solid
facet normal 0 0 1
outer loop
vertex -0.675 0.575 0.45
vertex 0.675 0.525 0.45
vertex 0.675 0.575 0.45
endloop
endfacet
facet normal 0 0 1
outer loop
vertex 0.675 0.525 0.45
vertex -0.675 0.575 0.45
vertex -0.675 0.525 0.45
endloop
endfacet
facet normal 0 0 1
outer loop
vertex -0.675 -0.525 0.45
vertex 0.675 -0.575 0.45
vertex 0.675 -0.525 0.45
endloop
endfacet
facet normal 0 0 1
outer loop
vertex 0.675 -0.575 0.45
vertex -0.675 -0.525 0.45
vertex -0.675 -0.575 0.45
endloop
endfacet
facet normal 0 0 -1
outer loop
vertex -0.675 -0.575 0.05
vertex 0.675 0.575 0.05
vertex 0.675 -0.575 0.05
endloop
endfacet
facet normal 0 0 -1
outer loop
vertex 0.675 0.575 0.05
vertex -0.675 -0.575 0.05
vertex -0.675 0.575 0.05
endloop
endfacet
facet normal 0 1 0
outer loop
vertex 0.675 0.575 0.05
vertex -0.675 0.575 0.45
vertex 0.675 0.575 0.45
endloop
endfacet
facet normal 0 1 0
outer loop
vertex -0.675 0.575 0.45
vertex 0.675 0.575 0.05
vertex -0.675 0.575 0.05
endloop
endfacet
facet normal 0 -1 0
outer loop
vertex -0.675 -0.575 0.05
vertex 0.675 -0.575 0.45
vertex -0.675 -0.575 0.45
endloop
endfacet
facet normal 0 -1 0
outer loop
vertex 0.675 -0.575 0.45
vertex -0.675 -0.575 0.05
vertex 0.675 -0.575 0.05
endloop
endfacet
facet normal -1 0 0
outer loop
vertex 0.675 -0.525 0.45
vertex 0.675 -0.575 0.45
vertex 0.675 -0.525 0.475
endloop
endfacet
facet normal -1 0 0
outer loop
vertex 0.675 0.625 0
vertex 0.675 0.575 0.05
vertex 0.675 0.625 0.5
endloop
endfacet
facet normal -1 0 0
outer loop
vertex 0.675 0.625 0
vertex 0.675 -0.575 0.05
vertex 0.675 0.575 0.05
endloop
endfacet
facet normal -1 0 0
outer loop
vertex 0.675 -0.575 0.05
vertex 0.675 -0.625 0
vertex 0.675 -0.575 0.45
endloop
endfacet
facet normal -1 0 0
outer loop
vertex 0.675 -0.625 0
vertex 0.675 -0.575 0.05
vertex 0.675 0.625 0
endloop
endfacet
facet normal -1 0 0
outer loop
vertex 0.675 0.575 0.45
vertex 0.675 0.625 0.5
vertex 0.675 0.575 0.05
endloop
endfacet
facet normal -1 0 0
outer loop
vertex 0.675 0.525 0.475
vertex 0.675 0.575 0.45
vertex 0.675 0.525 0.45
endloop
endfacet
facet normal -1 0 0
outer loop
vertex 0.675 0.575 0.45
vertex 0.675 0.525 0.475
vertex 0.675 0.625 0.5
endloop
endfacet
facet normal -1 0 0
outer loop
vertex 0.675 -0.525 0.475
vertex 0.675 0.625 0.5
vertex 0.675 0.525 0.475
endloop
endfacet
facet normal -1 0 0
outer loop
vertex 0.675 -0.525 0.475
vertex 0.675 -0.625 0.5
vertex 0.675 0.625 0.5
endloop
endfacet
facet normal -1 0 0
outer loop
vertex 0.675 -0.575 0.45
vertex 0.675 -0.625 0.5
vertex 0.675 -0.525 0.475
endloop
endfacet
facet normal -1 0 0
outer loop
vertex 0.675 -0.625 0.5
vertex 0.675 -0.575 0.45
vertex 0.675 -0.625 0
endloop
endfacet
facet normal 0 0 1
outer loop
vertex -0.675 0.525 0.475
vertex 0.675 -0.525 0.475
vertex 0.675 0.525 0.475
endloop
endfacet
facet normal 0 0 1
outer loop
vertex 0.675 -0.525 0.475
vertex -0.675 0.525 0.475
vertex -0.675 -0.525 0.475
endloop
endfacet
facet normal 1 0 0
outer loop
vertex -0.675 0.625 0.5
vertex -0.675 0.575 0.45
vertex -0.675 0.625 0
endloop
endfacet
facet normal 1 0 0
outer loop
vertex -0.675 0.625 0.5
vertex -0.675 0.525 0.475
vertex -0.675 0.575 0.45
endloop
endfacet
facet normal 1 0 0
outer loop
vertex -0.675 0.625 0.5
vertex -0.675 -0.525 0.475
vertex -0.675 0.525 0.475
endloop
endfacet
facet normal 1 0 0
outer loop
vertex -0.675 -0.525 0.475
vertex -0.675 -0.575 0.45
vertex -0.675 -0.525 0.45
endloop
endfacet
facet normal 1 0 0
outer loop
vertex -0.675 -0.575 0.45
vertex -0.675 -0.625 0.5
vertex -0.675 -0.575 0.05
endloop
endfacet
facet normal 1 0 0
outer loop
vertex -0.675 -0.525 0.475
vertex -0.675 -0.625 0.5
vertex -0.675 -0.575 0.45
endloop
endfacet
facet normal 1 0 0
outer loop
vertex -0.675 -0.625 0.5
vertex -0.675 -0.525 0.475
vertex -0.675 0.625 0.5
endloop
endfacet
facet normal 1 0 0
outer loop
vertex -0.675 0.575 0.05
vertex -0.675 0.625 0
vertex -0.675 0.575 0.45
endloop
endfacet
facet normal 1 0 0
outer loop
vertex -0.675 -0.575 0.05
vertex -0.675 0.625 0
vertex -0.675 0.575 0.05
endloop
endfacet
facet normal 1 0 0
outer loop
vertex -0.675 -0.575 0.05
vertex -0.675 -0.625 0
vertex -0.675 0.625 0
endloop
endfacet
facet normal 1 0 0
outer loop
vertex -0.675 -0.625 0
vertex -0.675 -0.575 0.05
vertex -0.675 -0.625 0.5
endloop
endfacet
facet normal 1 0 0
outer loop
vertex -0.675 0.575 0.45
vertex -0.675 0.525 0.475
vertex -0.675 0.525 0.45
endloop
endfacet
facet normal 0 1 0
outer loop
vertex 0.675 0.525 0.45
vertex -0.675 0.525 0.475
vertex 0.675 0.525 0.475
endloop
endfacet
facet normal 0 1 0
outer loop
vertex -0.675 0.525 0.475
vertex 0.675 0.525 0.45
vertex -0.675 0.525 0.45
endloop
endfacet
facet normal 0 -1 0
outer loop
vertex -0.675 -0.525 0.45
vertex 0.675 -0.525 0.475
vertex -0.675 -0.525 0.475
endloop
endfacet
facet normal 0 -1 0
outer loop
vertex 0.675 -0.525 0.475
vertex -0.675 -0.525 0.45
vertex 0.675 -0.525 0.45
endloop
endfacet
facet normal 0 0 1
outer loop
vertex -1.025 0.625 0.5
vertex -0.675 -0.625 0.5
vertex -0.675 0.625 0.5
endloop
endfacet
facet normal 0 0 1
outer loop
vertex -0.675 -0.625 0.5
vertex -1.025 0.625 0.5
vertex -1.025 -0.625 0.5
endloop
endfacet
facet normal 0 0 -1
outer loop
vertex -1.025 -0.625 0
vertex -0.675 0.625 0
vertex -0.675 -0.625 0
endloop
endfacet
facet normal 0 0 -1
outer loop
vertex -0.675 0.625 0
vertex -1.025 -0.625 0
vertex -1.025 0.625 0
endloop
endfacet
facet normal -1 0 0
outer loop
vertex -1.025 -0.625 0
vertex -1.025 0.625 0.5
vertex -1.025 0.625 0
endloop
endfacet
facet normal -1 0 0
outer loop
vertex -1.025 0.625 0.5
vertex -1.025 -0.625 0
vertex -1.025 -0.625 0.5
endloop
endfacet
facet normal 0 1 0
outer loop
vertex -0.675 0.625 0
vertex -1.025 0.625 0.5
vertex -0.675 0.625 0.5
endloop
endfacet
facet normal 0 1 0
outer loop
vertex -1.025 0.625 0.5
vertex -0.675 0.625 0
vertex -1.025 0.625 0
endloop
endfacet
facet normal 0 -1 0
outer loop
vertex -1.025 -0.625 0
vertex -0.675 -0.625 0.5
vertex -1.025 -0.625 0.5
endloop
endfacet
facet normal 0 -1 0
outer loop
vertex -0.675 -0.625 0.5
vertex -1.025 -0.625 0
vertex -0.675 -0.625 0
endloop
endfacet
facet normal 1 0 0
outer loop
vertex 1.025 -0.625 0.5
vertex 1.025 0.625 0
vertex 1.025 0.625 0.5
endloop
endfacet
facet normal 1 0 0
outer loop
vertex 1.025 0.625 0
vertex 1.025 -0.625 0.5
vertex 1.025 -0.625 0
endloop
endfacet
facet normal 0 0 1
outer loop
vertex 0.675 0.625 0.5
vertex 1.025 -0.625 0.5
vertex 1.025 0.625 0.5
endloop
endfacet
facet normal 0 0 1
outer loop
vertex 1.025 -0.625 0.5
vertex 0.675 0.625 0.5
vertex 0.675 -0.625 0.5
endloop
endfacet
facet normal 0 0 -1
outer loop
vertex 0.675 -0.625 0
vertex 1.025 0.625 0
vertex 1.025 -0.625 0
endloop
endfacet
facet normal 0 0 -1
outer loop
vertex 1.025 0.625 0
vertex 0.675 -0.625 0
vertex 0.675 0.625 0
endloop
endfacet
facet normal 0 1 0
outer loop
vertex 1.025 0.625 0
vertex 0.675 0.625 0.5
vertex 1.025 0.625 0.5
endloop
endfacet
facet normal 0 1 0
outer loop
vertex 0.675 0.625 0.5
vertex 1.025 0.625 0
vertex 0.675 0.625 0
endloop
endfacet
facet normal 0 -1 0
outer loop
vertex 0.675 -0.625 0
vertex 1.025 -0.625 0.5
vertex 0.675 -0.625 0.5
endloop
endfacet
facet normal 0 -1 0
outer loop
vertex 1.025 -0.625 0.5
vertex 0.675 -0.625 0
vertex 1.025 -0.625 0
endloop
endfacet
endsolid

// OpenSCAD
// file: proto/chip-r.scad
/*
OpenSCAD Model:  chip resistor

  L  - body length
  T  - pad length
  W  - width
  H  - height
  padcolor - color of metal leads
  bodycolor - color of body
  topcolor - color body top
  simple - 0 = realistic model, 1 = simplified model
*/

module chip_r(
	L=2.05,
	T=0.35,
	W=1.25,
	H=0.50,
	padcolor=[0.9,0.9,0.9],
	bodycolor=[1,1,0.9],
	topcolor=[0.0,0.0,0.0],
	labelcolor=[1,1,1],
	label="330",
	simple=1
) {

	module chippad() {
		if (simple) {
			color(padcolor)cube([T,W,H],center=true);
		} else {
			color(padcolor) union () {
				cube([T-0.1,W-0.1,H    ],center=true);
				cube([T-0.1,W    ,H-0.1],center=true);
				cube([T    ,W-0.1,H-0.1],center=true);
				translate([-T/2+0.05,-W/2+0.05,0]) cylinder(r=0.05,h=H-0.1,$fn=30,center=true);
				translate([T/2-0.05,-W/2+0.05,0]) cylinder(r=0.05,h=H-0.1,$fn=30,center=true);
				translate([-T/2+0.05,W/2-0.05,0]) cylinder(r=0.05,h=H-0.1,$fn=30,center=true);
				translate([T/2-0.05,W/2-0.05,0]) cylinder(r=0.05,h=H-0.1,$fn=30,center=true);
				translate([-T/2+0.05,0,H/2-0.05]) rotate(90,[1,0,0])cylinder(r=0.05,h=W-0.1,$fn=30,center=true);
				translate([T/2-0.05,0,H/2-0.05]) rotate(90,[1,0,0])cylinder(r=0.05,h=W-0.1,$fn=30,center=true);
				translate([-T/2+0.05,0,-H/2+0.05]) rotate(90,[1,0,0])cylinder(r=0.05,h=W-0.1,$fn=30,center=true);
				translate([T/2-0.05,0,-H/2+0.05]) rotate(90,[1,0,0])cylinder(r=0.05,h=W-0.1,$fn=30,center=true);
				translate([0,-W/2+0.05,H/2-0.05]) rotate(90,[0,1,0])cylinder(r=0.05,h=T-0.1,$fn=30,center=true);
				translate([0,W/2-0.05,H/2-0.05]) rotate(90,[0,1,0])cylinder(r=0.05,h=T-0.1,$fn=30,center=true);
				translate([0,-W/2+0.05,-H/2+0.05]) rotate(90,[0,1,0])cylinder(r=0.05,h=T-0.1,$fn=30,center=true);
				translate([0,W/2-0.05,-H/2+0.05]) rotate(90,[0,1,0])cylinder(r=0.05,h=T-0.1,$fn=30,center=true);
				translate([-T/2+0.05,-W/2+0.05,-H/2+0.05]) sphere(r=0.05, $fn=30);
				translate([-T/2+0.05,-W/2+0.05,H/2-0.05]) sphere(r=0.05, $fn=30);
				translate([T/2-0.05,-W/2+0.05,-H/2+0.05]) sphere(r=0.05, $fn=30);
				translate([T/2-0.05,-W/2+0.05,H/2-0.05]) sphere(r=0.05, $fn=30);
				translate([-T/2+0.05,W/2-0.05,-H/2+0.05]) sphere(r=0.05, $fn=30);
				translate([-T/2+0.05,W/2-0.05,H/2-0.05]) sphere(r=0.05, $fn=30);
				translate([T/2-0.05,W/2-0.05,-H/2+0.05]) sphere(r=0.05, $fn=30);
				translate([T/2-0.05,W/2-0.05,H/2-0.05]) sphere(r=0.05, $fn=30);
			}
		}
	}
	color(bodycolor) translate([0,0,H/2.]) cube([L-2*T+0.1,W-0.1,H-0.1],center=true);
	color(topcolor) translate([0,0,H-0.05]) cube([L-2*T,W-0.2,0.05],center=true);
	translate ([-L/2.+T/2.,0,H/2.]) chippad();
	translate ([L/2.-T/2.,0,H/2.]) chippad();
}
// main file
include<proto/chip-r.scad>

chip_r (
	L=2.05,
	T=0.35,
	W=1.25,
	H=0.50
);
